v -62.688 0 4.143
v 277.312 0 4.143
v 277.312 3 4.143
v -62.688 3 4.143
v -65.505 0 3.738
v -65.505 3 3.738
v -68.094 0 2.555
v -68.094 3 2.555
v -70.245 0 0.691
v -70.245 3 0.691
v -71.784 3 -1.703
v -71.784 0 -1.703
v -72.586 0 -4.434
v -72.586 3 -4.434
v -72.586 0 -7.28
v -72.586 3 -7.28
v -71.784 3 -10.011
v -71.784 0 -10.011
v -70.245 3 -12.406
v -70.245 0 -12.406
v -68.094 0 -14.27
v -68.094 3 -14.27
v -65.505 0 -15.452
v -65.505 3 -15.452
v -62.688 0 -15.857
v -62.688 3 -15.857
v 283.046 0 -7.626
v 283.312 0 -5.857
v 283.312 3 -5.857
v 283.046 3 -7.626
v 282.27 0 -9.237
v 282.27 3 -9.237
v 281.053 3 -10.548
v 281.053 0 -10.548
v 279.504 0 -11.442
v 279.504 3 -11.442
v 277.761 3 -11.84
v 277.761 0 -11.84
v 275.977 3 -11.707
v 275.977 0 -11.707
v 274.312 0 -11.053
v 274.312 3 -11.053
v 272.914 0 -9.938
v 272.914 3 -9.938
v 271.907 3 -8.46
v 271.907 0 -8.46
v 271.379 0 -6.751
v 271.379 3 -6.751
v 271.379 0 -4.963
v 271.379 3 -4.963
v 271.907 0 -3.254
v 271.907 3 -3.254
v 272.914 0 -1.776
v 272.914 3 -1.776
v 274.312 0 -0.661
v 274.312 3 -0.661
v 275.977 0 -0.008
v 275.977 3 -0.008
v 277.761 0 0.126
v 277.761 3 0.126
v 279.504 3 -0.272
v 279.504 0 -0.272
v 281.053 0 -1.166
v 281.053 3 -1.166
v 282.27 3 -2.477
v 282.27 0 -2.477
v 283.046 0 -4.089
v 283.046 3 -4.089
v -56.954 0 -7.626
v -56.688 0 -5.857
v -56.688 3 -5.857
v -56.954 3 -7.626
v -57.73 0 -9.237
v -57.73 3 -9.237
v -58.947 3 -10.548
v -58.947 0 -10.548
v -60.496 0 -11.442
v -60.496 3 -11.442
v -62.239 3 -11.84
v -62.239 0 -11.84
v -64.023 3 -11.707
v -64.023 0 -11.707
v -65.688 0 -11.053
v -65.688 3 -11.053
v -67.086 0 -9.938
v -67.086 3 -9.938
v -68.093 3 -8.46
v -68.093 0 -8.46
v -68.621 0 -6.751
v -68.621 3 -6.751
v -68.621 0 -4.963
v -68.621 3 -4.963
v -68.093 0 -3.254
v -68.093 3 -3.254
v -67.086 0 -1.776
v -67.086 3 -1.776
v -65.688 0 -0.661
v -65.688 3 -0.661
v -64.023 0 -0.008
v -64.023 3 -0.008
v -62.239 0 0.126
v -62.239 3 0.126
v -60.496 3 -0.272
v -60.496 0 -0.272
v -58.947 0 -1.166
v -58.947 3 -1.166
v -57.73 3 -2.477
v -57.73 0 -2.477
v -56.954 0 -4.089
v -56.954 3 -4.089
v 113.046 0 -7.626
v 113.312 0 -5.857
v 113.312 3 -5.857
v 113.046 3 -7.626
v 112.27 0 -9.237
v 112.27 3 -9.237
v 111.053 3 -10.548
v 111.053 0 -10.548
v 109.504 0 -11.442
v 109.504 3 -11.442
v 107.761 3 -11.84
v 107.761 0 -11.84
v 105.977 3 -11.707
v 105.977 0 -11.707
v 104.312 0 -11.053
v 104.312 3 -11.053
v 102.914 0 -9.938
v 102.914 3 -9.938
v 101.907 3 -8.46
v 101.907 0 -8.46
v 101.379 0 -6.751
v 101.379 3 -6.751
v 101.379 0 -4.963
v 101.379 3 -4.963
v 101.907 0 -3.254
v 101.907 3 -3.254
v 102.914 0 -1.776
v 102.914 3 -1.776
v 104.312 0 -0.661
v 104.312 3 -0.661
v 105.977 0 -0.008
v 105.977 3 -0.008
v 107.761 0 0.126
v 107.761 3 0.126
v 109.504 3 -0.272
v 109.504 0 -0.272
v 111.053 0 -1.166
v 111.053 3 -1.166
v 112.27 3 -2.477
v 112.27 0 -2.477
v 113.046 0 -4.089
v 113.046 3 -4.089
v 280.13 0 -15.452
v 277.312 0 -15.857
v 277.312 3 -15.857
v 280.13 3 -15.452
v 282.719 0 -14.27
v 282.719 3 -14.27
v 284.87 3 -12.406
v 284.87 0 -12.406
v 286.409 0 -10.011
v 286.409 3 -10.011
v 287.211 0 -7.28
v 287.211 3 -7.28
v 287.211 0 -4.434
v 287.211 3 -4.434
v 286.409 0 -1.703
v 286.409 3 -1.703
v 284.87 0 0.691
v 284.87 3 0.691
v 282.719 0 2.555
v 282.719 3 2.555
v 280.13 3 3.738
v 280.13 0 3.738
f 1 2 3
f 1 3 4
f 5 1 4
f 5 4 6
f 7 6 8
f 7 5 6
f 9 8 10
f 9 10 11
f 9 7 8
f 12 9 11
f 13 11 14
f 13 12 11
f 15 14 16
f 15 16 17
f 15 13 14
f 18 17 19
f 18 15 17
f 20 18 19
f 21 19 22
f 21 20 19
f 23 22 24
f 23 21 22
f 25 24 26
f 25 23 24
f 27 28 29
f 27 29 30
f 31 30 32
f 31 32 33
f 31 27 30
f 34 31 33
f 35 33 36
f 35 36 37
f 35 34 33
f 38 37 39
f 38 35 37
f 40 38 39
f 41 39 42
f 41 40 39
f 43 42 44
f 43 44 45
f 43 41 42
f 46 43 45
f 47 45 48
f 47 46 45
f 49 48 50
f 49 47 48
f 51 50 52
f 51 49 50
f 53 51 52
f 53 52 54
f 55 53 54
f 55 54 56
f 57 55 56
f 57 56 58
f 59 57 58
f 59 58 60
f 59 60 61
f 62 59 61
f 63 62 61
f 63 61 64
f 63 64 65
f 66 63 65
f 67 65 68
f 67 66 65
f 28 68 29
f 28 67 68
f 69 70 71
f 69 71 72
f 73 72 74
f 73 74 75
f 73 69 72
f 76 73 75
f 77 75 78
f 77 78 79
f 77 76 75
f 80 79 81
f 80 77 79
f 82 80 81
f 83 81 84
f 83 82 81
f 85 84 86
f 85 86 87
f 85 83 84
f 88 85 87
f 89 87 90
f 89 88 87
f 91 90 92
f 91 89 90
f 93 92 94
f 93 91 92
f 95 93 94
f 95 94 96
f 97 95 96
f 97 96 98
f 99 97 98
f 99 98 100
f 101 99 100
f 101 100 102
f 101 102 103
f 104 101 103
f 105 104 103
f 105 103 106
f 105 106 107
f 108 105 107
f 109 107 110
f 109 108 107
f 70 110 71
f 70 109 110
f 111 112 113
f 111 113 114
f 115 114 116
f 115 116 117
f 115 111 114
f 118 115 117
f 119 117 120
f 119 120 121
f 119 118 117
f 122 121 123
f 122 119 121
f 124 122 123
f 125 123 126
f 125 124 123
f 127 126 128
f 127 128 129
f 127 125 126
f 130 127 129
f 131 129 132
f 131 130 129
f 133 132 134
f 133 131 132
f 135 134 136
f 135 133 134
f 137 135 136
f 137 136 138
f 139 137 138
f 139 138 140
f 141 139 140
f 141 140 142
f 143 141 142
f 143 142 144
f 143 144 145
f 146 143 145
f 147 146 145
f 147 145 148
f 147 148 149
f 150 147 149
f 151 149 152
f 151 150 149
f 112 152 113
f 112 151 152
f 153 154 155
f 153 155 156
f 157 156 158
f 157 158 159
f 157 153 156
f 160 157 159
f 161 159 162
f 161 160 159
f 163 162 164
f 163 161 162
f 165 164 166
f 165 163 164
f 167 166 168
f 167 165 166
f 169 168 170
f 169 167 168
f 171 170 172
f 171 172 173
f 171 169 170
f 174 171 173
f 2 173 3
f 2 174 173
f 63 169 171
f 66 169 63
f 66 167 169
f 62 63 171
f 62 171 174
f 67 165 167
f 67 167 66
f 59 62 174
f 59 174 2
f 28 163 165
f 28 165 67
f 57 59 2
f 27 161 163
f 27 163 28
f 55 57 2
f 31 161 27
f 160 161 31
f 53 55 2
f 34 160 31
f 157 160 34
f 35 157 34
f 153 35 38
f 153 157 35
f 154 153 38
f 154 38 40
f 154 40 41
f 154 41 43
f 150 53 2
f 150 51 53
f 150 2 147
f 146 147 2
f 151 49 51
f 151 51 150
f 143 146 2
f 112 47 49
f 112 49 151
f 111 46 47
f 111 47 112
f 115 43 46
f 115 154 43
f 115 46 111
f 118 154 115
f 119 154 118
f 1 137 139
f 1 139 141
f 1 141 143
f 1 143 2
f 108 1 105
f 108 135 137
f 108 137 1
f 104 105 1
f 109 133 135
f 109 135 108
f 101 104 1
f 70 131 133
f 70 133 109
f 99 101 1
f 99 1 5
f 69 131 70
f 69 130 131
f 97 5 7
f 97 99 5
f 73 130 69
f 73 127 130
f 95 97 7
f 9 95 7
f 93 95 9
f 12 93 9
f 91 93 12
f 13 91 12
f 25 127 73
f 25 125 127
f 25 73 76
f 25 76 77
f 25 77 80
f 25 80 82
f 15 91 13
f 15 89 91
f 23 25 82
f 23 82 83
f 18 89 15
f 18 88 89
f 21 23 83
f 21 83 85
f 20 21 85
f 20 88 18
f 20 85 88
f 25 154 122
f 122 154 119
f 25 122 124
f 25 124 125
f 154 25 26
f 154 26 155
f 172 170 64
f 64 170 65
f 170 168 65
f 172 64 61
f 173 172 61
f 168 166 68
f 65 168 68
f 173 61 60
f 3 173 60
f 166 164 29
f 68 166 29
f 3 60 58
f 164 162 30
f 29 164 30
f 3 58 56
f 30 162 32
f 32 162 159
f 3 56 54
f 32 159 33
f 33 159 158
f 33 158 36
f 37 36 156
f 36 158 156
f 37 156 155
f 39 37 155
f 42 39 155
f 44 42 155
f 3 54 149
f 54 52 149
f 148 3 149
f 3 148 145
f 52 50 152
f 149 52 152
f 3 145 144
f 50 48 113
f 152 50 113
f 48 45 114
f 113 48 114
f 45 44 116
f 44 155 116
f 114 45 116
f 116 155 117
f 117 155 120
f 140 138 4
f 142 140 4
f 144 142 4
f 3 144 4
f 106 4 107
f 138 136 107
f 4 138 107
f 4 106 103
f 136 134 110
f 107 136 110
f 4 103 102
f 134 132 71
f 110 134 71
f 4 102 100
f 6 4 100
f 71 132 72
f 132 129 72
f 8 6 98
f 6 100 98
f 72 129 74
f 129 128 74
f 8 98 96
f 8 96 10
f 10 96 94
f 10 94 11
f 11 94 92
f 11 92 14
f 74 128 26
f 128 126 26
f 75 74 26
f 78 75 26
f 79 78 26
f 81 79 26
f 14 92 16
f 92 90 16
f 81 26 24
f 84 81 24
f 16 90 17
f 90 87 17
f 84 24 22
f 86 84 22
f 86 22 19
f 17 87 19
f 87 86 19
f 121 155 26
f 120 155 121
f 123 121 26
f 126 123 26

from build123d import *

# Parameters (mm, degrees)
SKETCH1_R           = 6
BOSS_EXTRUDE1_DEPTH = 3


with BuildPart() as part:
    # Sketch1 → Boss-Extrude1 (new body)
    with BuildSketch(Plane(origin=(0, 0, 0), x_dir=(1, 0, 0), z_dir=(0, 1, 0))):
        with BuildLine():
            Line((-62.687563754, 15.857142857), (277.312436246, 15.857142857))
            ThreePointArc((277.312436246, 15.857142857), (287.312436246, 5.857142857), (277.312436246, -4.142857143))
            Line((277.312436246, -4.142857143), (-62.687563754, -4.142857143))
            ThreePointArc((-62.687563754, -4.142857143), (-72.687563754, 5.857142857), (-62.687563754, 15.857142857))
        make_face()
        with Locations((-62.687563754, 5.857142857)):
            Circle(SKETCH1_R, mode=Mode.SUBTRACT)
        with Locations((277.312436246, 5.857142857)):
            Circle(SKETCH1_R, mode=Mode.SUBTRACT)
        with Locations((107.312436246, 5.857142857)):
            Circle(SKETCH1_R, mode=Mode.SUBTRACT)
    extrude(amount=BOSS_EXTRUDE1_DEPTH)


solid = part.part
